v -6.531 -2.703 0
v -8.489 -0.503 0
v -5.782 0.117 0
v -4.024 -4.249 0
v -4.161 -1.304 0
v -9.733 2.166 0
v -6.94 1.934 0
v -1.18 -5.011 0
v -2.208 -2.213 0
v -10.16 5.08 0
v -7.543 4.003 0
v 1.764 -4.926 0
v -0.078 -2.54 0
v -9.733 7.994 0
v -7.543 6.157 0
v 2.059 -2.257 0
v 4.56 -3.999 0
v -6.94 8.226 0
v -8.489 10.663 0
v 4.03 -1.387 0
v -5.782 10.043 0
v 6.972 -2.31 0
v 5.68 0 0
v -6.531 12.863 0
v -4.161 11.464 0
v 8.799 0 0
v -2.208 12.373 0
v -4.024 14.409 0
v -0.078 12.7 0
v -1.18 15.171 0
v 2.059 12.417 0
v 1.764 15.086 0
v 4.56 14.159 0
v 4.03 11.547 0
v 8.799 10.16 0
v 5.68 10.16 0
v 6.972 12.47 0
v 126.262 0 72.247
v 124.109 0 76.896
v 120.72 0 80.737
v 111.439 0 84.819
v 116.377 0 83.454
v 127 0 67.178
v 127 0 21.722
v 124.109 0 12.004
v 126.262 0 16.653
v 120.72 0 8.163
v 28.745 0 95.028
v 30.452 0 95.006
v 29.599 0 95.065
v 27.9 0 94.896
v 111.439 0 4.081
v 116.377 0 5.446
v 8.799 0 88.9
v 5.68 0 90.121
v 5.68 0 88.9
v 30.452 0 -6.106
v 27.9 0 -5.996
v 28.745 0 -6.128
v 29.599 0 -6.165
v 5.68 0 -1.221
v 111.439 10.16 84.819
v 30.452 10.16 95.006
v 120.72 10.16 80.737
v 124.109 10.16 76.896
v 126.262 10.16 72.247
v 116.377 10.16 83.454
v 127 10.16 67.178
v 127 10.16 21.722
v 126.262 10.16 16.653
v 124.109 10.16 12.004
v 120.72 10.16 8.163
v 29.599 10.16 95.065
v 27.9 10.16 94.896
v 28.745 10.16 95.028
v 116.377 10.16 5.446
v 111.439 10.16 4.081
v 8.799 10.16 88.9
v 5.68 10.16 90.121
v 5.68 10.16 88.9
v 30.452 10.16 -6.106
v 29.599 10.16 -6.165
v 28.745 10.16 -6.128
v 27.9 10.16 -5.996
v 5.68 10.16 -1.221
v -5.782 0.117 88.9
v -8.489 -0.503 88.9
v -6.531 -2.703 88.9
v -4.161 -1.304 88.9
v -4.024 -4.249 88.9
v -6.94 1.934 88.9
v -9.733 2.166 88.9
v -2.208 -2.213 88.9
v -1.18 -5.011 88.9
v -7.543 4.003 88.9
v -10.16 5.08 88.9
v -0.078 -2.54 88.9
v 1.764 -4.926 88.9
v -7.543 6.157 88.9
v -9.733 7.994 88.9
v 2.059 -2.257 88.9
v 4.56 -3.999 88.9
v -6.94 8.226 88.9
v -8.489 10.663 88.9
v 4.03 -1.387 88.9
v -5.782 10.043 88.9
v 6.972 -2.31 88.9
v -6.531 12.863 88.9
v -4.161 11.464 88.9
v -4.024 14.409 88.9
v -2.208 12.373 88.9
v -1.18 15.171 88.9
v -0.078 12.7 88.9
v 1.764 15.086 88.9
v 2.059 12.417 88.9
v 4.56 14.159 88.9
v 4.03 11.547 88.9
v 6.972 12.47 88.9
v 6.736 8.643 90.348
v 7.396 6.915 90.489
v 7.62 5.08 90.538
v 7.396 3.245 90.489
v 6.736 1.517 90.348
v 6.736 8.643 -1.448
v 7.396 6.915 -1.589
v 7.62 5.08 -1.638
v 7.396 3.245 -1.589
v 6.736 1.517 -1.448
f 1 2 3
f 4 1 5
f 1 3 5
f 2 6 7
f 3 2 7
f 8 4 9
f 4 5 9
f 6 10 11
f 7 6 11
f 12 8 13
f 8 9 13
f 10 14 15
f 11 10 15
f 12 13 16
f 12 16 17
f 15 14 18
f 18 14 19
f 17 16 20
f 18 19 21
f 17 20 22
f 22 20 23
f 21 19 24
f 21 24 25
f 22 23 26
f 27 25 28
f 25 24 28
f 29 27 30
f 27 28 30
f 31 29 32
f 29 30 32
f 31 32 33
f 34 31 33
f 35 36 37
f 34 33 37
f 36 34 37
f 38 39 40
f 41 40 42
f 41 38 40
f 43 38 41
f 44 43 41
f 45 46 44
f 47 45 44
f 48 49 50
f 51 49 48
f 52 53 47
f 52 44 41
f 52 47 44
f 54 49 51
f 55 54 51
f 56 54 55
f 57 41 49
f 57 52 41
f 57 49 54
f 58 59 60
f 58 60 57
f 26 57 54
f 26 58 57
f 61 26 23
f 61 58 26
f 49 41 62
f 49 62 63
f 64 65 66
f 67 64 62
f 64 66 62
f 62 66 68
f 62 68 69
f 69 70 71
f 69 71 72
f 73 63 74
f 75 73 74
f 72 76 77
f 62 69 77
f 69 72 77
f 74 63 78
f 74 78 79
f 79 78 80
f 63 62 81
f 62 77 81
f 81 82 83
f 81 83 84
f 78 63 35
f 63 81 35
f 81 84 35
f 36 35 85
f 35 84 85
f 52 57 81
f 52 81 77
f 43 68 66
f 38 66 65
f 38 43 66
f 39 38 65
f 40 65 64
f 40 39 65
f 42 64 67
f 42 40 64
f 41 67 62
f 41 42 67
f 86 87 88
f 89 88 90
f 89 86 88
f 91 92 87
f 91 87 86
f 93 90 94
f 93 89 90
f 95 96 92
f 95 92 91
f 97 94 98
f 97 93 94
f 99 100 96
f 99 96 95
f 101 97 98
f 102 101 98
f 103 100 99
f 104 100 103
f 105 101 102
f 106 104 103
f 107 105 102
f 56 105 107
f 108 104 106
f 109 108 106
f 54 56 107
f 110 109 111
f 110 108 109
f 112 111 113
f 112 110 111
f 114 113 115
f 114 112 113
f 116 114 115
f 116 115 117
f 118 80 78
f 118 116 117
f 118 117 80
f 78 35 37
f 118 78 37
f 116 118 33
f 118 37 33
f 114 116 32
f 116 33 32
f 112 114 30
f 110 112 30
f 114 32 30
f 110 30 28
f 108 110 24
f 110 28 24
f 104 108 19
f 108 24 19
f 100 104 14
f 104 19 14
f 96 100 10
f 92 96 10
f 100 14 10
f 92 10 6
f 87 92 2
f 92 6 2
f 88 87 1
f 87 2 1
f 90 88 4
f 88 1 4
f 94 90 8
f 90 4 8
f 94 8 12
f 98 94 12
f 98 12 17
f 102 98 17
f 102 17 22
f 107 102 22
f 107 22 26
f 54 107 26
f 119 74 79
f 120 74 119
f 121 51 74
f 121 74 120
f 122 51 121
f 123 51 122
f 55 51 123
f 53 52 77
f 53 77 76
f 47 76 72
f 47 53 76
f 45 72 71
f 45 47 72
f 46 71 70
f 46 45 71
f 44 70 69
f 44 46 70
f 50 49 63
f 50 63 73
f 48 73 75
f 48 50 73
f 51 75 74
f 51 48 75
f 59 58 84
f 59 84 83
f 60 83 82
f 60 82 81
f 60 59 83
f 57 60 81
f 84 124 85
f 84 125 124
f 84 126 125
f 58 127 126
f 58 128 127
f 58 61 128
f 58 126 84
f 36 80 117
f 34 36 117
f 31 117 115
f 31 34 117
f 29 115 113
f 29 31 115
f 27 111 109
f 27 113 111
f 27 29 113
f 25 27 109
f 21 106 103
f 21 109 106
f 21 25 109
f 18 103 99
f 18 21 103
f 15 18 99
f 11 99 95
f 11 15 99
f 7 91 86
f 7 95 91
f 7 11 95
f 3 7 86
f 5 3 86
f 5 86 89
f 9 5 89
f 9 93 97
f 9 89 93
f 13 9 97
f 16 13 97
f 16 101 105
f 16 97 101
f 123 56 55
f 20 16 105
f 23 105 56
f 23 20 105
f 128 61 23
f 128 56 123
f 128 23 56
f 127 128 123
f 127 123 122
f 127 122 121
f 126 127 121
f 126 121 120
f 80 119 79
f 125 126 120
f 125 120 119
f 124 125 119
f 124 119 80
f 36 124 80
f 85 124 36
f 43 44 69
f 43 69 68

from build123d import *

# Parameters (mm, degrees)
BOSS_EXTRUDE1_DEPTH     = 10.16
SKETCH4_R               = 10.16
BOSS_EXTRUDE2_DEPTH     = 88.9
CUT_EXTRUDE1_DEPTH      = 160.369980112
CUT_EXTRUDE1_DEPTH_BACK = 160.369980112
SKETCH5_R               = 7.62


with BuildPart() as part:
    # Sketch1 → Boss-Extrude1 (new body)
    with BuildSketch(Plane(origin=(0, 0, 0), x_dir=(1, 0, 0), z_dir=(0, 1, 0))):
        with BuildLine():
            Line((0, 0), (27.899788868, 5.995845649))
            ThreePointArc((27.899788868, 5.995845649), (29.17117087, 6.158806163), (30.451880553, 6.106355894))
            Line((30.451880553, 6.106355894), (111.439136822, -4.081394546))
            ThreePointArc((111.439136822, -4.081394546), (122.553878894, -9.960729137), (127, -21.722364808))
            Line((127, -21.722364808), (127, -67.177635192))
            ThreePointArc((127, -67.177635192), (122.553878894, -78.939270863), (111.439136822, -84.818605454))
            Line((111.439136822, -84.818605454), (30.451880553, -95.006355894))
            ThreePointArc((30.451880553, -95.006355894), (29.17117087, -95.058806163), (27.899788868, -94.895845649))
            Line((27.899788868, -94.895845649), (0, -88.9))
            Line((0, -88.9), (0, 0))
        make_face()
    extrude(amount=BOSS_EXTRUDE1_DEPTH)

    # Sketch4 → Boss-Extrude2 (add)
    with BuildSketch(Plane.XY):
        with Locations((0, 5.08)):
            Circle(SKETCH4_R)
    extrude(amount=BOSS_EXTRUDE2_DEPTH)

    # Sketch5 → Cut-Extrude1 (cut, two sides: drawn at the far end of the back side and taken through both)
    with BuildSketch(Plane.XY.offset(-CUT_EXTRUDE1_DEPTH_BACK)):
        with Locations(Location((0, 5.08, 0), (0, 0, 41.810314896))):
            Circle(SKETCH5_R)
    extrude(amount=CUT_EXTRUDE1_DEPTH + CUT_EXTRUDE1_DEPTH_BACK, mode=Mode.SUBTRACT)


solid = part.part
